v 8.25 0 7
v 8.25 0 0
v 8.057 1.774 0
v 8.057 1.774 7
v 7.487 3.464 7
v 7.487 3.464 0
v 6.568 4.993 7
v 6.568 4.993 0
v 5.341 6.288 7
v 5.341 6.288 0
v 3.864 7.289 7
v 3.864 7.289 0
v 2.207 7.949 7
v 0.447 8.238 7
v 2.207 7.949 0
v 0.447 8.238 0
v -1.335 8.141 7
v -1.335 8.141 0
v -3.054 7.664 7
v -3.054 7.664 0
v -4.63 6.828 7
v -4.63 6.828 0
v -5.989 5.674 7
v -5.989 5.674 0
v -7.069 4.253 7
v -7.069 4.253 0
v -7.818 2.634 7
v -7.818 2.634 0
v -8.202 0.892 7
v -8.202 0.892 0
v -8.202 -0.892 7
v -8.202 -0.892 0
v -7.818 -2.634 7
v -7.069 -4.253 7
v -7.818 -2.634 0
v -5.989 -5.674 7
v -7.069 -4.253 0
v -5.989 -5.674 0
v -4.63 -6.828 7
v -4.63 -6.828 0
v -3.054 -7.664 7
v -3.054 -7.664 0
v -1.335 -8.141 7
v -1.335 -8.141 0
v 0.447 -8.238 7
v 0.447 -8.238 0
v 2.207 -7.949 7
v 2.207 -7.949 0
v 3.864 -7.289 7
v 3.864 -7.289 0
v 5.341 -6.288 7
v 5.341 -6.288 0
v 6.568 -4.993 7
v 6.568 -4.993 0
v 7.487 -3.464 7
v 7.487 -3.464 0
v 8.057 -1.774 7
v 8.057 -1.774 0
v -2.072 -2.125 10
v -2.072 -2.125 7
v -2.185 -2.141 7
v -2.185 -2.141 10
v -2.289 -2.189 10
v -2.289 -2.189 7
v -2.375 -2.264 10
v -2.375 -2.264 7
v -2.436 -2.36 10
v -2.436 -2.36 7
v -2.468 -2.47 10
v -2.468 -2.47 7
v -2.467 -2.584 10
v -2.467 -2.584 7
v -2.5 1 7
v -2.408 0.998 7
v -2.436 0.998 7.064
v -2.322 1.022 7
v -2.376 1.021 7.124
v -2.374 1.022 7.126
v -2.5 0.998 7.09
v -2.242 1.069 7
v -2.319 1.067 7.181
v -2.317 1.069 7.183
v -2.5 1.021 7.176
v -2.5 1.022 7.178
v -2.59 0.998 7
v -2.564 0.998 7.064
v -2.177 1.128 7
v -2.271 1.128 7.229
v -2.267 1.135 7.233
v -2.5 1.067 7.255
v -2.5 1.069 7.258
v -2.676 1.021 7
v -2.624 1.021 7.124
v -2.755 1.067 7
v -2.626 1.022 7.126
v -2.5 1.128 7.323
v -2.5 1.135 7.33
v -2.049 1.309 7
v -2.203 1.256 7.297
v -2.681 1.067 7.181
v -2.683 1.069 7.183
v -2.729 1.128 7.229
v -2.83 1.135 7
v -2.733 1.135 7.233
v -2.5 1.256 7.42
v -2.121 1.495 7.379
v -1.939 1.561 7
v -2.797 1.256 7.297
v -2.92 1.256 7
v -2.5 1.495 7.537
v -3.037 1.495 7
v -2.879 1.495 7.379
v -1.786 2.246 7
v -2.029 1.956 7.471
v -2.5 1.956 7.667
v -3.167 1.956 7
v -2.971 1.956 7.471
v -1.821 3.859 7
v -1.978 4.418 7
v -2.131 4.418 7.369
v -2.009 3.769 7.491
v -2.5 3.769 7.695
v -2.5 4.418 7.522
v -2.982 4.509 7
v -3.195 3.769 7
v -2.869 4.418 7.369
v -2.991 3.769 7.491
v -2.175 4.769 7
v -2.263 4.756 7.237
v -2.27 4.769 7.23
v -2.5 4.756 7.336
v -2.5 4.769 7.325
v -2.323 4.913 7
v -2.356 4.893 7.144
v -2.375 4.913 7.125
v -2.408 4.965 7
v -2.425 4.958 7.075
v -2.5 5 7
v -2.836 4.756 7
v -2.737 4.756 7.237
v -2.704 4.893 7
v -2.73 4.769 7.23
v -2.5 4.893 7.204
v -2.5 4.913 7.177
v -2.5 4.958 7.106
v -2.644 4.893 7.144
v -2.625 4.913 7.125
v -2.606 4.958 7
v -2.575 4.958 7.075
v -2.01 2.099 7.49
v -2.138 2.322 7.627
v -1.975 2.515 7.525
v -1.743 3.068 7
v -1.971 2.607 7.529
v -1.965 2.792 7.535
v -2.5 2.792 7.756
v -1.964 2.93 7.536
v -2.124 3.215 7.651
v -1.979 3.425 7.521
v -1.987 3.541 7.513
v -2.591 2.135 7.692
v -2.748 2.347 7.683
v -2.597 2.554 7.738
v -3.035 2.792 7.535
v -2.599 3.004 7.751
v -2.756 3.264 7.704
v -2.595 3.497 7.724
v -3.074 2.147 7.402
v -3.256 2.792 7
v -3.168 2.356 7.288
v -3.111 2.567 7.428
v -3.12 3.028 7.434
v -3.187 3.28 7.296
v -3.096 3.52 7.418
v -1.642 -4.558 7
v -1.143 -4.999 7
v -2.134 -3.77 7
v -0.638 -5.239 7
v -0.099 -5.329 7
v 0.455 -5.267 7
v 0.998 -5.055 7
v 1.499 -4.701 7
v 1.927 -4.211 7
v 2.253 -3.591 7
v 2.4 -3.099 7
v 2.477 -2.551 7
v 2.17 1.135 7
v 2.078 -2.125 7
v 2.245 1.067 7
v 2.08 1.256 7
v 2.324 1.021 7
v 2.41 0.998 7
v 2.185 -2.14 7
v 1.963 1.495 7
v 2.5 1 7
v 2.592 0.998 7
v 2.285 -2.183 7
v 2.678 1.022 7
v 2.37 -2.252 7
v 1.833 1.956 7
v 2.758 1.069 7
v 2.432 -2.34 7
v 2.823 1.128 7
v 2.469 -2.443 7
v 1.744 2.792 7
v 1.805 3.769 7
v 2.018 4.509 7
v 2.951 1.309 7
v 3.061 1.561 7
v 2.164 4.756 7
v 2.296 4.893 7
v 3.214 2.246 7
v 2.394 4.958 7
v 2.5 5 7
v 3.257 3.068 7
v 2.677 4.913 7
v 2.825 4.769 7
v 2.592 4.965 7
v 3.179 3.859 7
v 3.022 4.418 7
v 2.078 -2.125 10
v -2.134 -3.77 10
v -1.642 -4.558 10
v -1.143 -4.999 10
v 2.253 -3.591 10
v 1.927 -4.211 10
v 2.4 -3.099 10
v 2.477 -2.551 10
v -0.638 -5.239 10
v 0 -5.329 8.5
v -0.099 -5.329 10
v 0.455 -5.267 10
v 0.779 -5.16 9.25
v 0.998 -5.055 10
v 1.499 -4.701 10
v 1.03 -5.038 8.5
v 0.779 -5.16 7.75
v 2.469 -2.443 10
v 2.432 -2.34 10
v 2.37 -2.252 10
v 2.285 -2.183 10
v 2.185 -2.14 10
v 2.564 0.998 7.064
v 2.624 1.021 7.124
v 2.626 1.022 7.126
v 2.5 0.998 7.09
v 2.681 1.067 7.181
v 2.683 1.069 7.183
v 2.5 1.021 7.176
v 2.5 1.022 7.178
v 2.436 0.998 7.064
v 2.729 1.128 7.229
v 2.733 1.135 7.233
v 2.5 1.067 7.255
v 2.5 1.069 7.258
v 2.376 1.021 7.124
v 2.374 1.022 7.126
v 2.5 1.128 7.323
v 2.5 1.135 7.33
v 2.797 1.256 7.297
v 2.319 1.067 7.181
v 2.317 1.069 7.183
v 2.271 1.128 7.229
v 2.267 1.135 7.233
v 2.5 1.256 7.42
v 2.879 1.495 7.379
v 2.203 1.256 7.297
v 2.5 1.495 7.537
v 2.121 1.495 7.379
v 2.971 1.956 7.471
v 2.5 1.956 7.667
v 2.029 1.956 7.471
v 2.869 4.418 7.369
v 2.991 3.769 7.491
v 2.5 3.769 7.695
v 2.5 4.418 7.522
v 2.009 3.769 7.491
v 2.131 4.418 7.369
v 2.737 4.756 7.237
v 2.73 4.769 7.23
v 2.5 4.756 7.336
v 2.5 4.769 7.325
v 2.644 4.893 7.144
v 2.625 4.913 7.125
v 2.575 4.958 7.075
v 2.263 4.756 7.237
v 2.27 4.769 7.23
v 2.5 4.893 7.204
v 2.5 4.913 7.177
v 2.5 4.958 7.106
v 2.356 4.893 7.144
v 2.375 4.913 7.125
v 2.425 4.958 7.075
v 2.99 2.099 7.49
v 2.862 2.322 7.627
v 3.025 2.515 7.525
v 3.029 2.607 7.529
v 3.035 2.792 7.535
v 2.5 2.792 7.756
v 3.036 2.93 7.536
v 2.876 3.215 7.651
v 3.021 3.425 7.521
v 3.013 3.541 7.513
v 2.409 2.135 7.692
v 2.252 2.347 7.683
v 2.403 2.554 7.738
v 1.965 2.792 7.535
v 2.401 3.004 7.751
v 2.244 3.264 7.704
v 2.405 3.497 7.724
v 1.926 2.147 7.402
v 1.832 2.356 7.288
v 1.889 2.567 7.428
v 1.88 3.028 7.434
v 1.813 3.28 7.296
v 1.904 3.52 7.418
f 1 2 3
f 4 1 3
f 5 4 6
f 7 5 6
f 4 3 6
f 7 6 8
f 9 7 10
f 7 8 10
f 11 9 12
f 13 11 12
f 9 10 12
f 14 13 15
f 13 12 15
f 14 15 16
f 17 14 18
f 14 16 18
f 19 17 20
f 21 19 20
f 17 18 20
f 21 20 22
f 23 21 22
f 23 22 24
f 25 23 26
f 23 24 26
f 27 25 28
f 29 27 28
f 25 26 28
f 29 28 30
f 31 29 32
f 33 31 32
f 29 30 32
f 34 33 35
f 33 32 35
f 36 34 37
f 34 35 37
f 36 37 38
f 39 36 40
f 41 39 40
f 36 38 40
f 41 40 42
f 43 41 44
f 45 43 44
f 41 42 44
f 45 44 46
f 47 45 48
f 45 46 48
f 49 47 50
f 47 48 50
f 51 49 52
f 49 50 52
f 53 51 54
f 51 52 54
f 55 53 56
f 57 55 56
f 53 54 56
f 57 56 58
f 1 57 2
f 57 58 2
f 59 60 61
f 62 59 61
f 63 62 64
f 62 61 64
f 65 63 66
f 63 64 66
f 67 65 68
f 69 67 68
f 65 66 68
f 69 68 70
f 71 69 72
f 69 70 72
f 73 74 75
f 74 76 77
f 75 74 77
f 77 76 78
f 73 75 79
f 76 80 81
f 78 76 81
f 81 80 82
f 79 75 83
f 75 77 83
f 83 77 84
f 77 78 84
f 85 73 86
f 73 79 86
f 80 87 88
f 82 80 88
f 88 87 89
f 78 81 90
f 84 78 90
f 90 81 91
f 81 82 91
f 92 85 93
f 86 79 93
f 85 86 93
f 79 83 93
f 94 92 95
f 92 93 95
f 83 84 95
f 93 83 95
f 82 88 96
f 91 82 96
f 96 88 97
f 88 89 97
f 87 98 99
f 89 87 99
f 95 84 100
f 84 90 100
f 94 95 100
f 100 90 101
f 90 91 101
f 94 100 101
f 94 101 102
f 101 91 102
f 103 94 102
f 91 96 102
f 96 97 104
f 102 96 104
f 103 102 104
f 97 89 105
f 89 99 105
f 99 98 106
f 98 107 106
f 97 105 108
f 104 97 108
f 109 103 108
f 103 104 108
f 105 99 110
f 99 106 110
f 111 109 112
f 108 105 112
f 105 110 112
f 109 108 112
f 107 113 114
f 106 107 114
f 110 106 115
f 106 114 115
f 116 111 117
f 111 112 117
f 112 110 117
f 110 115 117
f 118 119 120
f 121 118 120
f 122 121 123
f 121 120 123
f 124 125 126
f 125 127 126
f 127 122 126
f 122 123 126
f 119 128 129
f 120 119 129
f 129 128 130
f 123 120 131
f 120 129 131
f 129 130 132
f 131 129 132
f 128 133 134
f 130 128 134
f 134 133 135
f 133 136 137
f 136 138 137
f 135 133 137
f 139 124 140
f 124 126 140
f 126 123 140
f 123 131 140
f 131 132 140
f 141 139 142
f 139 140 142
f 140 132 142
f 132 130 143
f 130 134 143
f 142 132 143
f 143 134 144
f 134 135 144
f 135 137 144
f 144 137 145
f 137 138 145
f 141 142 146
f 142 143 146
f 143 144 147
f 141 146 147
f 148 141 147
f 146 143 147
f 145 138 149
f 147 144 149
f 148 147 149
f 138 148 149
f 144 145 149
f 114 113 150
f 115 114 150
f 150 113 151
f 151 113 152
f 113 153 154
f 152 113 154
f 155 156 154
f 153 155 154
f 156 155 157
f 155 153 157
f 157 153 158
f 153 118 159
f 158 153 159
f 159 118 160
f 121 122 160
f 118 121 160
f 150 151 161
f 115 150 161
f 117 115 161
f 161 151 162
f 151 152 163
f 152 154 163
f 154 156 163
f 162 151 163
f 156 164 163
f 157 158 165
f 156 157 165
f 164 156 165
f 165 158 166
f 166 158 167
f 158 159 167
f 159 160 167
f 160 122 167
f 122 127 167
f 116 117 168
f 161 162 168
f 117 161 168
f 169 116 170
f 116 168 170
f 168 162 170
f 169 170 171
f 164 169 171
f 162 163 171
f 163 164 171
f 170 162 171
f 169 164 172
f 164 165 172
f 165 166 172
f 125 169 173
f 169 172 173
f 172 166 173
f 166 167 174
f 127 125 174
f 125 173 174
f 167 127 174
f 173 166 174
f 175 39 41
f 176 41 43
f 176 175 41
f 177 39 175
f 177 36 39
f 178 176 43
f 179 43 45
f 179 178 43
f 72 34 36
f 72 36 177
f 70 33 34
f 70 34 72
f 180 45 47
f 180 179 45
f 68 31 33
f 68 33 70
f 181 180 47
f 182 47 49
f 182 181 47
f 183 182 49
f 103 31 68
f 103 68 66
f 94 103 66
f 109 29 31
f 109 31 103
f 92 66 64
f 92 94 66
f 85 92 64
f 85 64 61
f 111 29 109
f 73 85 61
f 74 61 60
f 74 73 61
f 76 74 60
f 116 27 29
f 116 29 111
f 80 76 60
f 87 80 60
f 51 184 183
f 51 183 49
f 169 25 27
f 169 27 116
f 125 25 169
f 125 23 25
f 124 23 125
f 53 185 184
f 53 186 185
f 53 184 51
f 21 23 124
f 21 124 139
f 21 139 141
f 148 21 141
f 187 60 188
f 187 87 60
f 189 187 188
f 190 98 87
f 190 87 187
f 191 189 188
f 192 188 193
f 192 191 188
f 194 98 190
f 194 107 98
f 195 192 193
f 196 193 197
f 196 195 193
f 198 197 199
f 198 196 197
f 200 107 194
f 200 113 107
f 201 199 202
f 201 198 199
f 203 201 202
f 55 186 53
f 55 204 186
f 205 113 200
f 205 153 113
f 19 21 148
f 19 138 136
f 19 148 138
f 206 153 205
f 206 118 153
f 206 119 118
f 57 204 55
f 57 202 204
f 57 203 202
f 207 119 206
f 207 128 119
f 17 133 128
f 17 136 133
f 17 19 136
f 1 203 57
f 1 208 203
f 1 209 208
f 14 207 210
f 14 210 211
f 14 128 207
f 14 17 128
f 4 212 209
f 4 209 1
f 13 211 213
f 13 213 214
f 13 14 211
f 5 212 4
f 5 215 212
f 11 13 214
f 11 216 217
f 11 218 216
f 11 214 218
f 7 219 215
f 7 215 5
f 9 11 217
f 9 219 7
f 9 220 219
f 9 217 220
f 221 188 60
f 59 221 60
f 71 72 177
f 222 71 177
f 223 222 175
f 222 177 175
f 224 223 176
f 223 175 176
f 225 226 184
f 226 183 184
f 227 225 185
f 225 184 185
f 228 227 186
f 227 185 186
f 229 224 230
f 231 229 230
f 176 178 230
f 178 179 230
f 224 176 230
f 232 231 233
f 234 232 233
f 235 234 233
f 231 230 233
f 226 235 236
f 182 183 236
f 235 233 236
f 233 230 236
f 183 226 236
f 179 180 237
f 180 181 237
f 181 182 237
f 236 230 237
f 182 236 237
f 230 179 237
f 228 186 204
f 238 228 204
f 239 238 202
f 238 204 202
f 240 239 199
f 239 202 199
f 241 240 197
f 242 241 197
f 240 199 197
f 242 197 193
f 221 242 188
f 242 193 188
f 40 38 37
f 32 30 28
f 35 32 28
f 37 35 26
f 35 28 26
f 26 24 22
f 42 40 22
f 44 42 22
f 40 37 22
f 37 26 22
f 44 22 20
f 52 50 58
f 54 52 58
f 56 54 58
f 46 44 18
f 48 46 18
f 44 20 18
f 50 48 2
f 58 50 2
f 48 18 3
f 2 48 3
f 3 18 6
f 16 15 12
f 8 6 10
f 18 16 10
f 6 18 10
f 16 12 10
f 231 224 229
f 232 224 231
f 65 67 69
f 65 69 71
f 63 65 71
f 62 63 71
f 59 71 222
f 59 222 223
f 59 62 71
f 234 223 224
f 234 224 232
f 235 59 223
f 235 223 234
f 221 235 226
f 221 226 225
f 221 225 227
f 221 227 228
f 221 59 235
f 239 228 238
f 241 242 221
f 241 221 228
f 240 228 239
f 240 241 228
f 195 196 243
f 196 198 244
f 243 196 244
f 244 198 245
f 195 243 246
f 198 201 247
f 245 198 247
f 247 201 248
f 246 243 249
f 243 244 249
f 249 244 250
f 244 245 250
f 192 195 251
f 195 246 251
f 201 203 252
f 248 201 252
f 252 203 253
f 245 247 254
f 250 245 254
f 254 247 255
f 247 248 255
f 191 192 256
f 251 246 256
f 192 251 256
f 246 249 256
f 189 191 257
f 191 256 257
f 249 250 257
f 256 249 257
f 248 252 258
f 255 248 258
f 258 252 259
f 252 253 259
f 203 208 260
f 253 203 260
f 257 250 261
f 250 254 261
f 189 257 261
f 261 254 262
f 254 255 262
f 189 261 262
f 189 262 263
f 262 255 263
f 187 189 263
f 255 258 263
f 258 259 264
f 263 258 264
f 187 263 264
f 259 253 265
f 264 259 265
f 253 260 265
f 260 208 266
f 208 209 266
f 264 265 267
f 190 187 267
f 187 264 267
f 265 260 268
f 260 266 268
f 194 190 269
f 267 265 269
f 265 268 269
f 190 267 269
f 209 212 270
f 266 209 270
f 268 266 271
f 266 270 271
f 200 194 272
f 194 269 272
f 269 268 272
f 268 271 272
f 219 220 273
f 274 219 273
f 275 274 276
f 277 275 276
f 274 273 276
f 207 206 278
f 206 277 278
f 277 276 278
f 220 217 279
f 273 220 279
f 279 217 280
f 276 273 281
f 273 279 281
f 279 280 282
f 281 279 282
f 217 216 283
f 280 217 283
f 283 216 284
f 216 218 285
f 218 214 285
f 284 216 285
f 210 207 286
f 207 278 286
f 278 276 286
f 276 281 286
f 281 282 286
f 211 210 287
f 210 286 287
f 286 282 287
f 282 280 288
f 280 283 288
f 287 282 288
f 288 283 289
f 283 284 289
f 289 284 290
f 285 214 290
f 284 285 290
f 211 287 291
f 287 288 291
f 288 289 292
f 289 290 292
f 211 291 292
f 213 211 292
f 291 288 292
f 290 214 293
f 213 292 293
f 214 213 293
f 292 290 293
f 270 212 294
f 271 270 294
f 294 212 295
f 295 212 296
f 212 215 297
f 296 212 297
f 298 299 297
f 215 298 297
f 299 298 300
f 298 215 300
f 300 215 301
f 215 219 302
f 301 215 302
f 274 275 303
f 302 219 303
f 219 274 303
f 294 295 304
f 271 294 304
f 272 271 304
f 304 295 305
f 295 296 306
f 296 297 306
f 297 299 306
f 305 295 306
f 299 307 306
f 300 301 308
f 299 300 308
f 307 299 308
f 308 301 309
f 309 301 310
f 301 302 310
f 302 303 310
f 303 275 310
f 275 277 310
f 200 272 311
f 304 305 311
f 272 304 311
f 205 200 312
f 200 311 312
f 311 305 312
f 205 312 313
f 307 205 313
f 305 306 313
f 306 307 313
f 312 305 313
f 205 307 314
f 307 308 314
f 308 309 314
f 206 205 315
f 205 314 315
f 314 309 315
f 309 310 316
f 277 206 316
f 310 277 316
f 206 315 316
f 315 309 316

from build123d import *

# Parameters (mm, degrees)
F0_R     = 8.25
F1_DEPTH = 7
F5_DEPTH = 3


with BuildPart() as f1:
    # F0 (on Top) → F1 (new body)
    with BuildSketch(Plane.XY):
        Circle(F0_R)
    extrude(amount=F1_DEPTH)

    # F2 (on face) → F3 (revolve)
    with BuildSketch(Plane.XY.offset(7)):
        with BuildLine():
            Line((-2.5, 1), (-2.5, 5))
            add(Edge.make_bspline(
                [(-2.5, 1), (-3.43300635, 0.8503383724), (-3.585588187, 4.7030341811), (-2.5, 5)],
                knots=[0, 0, 0, 0, 4, 4, 4, 4], degree=3))
        make_face()
    revolve(axis=Axis((-2.5, 3, 7), (0, -1, 0)))

    # F2 (on face) → F4 (revolve)
    with BuildSketch(Plane.XY.offset(7)):
        with BuildLine():
            Line((2.5, 1), (2.5, 5))
            add(Edge.make_bspline(
                [(2.5, 1), (1.56699365, 0.8503383724), (1.414411813, 4.7030341811), (2.5, 5)],
                knots=[0, 0, 0, 0, 4, 4, 4, 4], degree=3))
        make_face()
    revolve(axis=Axis((2.5, 3, 7), (0, -1, 0)))

    # F2 (on face) → F5 (join)
    with BuildSketch(Plane.XY.offset(7)):
        with BuildLine():
            Line((2.0776409017, -2.1250108257), (-2.0717297527, -2.1250108257))
            ThreePointArc((-2.0717297527, -2.1250108257), (-2.374725272, -2.2638715616), (-2.4673498875, -2.5840422494))
            add(Edge.make_bspline(
                [(-2.4673498875, -2.5840422494), (-2.1958217419, -4.4037849366), (-0.0853140585, -6.3108429823), (2.3625802937, -4.2915575872), (2.4767824749, -2.5512025144)],
                knots=[0.0375043401, 0.0375043401, 0.0375043401, 0.0375043401, 0.50066272, 0.963428104, 0.963428104, 0.963428104, 0.963428104], degree=3))
            ThreePointArc((2.4767824749, -2.5512025144), (2.3695969562, -2.2515850364), (2.0776409017, -2.1250108257))
        make_face()
    extrude(amount=F5_DEPTH)


solid = f1.part
